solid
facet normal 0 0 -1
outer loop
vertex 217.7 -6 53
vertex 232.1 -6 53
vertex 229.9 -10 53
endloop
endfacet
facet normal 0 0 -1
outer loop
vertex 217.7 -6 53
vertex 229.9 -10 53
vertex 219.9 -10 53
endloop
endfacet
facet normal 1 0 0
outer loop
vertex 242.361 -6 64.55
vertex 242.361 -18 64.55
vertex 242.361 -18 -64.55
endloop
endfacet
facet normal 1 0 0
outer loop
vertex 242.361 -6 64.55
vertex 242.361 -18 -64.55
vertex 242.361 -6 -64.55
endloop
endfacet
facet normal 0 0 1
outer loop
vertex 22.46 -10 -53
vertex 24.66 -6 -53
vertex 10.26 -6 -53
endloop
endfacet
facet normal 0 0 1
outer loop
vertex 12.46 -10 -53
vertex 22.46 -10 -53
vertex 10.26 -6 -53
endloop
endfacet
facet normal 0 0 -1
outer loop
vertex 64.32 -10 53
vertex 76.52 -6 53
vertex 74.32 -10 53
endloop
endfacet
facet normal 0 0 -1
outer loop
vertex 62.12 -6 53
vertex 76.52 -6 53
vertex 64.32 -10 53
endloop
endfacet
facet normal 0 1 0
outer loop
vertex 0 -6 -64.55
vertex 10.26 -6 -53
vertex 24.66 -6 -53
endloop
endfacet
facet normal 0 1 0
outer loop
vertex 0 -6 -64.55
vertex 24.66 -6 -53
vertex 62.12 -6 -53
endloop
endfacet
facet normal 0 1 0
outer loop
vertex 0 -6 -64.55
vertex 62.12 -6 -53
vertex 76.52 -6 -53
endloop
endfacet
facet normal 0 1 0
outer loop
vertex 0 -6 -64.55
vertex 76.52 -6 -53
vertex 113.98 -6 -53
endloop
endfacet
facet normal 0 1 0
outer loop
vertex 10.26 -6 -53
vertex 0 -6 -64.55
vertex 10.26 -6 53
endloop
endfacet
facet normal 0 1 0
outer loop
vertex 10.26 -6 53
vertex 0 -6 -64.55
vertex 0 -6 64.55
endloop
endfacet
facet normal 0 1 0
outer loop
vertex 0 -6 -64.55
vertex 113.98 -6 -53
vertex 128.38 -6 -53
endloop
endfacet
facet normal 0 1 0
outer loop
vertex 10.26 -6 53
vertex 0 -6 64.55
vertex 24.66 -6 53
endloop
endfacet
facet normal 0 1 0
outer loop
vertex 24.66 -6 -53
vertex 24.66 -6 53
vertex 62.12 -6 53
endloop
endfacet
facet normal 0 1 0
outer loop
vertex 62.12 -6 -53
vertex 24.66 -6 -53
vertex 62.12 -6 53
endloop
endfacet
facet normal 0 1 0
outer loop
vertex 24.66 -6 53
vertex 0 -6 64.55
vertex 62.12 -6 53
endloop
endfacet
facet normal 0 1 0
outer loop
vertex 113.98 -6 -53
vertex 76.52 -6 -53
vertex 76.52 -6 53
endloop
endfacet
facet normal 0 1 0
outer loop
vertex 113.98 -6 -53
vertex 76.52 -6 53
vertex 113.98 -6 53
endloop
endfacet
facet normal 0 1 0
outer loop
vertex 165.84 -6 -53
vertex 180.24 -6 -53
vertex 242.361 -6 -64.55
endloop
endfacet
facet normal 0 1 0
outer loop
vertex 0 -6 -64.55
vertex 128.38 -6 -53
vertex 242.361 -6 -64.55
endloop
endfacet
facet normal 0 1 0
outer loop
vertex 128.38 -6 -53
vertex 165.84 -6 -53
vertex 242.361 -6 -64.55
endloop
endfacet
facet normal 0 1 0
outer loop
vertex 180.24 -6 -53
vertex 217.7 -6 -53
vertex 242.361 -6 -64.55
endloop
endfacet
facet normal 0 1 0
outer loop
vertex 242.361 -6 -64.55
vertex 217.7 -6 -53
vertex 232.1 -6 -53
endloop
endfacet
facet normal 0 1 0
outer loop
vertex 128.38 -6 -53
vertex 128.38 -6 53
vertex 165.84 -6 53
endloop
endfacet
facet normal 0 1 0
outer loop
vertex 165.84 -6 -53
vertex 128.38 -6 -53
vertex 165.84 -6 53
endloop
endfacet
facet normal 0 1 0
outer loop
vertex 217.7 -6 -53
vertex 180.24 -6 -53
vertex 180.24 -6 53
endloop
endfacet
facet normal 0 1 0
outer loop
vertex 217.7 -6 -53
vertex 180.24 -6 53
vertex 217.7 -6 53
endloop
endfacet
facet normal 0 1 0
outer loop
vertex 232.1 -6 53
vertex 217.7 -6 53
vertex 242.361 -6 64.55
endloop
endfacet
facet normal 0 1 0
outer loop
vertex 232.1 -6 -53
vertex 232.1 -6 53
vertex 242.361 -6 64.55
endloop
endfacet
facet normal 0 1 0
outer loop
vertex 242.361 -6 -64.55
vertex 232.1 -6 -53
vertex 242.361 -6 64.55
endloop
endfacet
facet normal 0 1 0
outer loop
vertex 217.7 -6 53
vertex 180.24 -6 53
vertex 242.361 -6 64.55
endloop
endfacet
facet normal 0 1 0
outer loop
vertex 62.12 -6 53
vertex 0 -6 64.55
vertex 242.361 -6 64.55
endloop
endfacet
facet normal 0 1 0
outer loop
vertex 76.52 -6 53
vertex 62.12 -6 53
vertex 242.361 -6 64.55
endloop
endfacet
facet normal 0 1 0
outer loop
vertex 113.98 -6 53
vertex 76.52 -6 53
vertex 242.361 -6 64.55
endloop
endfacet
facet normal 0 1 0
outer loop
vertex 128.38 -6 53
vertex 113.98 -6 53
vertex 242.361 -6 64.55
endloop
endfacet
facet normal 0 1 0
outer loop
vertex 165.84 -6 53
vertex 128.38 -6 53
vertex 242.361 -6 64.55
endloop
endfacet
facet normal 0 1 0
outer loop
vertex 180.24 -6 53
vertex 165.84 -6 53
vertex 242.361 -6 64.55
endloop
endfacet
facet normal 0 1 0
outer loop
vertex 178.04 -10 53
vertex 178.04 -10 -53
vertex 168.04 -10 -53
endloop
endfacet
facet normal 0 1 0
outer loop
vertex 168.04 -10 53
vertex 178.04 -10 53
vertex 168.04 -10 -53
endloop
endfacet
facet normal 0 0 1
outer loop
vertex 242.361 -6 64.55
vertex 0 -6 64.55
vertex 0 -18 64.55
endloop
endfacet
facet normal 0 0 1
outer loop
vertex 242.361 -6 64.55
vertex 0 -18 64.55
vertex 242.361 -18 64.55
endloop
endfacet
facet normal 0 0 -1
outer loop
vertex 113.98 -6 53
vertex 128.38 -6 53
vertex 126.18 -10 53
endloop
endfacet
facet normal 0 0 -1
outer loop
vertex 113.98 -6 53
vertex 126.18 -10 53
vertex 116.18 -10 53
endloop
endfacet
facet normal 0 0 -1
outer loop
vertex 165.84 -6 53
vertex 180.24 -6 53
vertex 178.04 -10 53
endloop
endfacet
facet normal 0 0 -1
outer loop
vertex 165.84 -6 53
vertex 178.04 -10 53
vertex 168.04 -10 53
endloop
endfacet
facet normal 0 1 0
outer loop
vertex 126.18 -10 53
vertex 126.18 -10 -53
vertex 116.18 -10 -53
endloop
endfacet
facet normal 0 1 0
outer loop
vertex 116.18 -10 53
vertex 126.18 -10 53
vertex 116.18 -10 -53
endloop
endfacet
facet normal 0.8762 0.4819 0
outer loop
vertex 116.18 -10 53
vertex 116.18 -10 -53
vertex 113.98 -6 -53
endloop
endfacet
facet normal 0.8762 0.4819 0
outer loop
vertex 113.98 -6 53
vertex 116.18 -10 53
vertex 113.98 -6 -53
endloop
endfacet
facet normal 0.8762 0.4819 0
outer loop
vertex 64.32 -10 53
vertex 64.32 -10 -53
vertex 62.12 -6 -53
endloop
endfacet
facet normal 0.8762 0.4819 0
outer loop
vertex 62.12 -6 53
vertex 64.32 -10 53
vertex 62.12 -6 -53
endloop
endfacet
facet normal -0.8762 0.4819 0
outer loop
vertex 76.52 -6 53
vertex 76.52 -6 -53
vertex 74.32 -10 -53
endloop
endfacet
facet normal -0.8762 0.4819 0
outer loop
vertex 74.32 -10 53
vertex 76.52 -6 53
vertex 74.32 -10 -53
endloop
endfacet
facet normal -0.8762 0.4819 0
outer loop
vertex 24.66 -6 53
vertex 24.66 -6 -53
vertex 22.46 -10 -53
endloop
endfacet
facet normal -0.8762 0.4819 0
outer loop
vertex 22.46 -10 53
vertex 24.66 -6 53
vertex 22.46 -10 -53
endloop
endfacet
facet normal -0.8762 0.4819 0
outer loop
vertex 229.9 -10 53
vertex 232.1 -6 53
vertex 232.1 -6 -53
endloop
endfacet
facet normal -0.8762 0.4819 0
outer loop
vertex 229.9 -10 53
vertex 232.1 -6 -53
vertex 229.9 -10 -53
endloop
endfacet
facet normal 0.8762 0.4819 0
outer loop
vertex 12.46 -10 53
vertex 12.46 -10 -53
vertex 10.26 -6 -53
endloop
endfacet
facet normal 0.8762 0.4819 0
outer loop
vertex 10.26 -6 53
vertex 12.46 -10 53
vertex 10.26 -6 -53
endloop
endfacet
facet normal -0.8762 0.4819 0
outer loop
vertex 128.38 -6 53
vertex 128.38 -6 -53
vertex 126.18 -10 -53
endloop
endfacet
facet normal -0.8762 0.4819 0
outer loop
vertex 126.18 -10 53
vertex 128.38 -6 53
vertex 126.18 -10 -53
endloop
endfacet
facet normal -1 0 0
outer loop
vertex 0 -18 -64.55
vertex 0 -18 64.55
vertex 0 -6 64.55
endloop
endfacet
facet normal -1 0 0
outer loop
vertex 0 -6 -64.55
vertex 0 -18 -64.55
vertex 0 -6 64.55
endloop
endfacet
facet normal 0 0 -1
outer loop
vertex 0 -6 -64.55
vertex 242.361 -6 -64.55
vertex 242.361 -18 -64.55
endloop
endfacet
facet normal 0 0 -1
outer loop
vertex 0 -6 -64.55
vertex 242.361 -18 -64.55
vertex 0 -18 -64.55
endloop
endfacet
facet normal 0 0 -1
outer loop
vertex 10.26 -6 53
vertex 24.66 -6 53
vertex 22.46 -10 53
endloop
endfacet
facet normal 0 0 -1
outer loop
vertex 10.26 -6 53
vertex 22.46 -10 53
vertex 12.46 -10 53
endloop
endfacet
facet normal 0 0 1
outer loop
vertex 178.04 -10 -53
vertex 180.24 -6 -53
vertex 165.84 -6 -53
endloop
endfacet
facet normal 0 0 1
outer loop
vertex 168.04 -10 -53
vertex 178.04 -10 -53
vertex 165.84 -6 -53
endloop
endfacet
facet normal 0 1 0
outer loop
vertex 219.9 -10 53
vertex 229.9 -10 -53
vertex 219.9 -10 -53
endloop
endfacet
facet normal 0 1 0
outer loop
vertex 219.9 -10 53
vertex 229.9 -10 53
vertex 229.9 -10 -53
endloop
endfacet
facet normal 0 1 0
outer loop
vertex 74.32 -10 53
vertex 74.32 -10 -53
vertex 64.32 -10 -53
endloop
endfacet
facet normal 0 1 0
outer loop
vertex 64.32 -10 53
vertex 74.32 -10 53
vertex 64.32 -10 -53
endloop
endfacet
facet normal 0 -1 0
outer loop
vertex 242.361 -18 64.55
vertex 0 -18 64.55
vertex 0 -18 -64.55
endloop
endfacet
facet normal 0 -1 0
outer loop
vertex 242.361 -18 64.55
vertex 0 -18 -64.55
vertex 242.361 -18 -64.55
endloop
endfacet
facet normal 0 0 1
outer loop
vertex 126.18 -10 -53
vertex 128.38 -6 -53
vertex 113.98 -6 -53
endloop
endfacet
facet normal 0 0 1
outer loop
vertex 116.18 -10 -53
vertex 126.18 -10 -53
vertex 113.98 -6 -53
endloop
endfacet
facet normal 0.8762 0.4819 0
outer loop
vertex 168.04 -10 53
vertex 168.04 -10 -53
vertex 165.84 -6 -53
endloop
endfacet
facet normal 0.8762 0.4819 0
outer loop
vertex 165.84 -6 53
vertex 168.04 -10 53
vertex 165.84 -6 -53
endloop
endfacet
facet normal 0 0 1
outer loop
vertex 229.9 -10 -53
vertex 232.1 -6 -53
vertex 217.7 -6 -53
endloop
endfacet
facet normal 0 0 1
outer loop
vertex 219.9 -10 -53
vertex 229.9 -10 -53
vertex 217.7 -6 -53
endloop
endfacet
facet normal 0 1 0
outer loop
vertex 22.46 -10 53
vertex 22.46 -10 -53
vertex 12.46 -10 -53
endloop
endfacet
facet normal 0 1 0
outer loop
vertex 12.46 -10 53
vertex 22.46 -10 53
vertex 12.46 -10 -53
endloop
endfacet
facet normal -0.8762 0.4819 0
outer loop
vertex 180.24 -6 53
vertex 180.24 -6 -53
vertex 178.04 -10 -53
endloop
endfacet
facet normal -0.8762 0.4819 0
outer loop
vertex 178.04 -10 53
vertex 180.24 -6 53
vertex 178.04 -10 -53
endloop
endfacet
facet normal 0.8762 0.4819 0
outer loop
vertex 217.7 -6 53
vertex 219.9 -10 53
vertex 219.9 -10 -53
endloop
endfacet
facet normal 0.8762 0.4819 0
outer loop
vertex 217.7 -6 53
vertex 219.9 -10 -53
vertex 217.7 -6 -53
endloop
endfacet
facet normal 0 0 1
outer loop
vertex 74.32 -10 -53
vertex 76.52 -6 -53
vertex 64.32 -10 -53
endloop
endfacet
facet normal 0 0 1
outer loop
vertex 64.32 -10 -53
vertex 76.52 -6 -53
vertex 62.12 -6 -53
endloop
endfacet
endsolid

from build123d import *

# Parameters (mm, degrees)
EXTRUDE_1_DEPTH     = 60
SKETCH_9_W          = 242.360715673
SKETCH_9_H          = 17.5
SKETCH_9_R          = 2.1
EXTRUDE_2_DEPTH     = 3
SKETCH_13_W         = 242.360715673
SKETCH_13_H         = 16
SKETCH_13_R         = 2.1
EXTRUDE_3_DEPTH     = 1.55
SKETCH_14_W         = 242.360715673
SKETCH_14_H         = 129.1
SKETCH_14_R         = 2.1
EXTRUDE_4_DEPTH     = 3
SKETCH_15_W         = 222.641049517
SKETCH_15_H         = 9.29970853
EXTRUDE_5_DEPTH     = 129.1
SKETCH_16_W         = 242.360715673
SKETCH_16_H         = 33.21324475
EXTRUDE_6_DEPTH     = 3
SKETCH_18_W         = 242.360715673
SKETCH_18_H         = 20.5
EXTRUDE_7_DEPTH     = 126.1
SKETCH_19_W         = 242.360715673
SKETCH_19_H         = 8.5
CUT_EXTRUDE_1_DEPTH = 276.18998256
CUT_EXTRUDE_2_DEPTH = 53


with BuildPart() as part:
    # ｽｹｯﾁ5 → ﾎﾞｽ - 押し出し1 (new body)
    with BuildSketch(Plane.XY.offset(-1.55)):
        with BuildLine():
            Line((242.360715673, -15), (242.360715673, -2.976))
            Line((242.360715673, -2.976), (240.239284327, -2.976))
            ThreePointArc((240.239284327, -2.976), (239.45348461, -2.728238301), (238.951905437, -2.074567596))
            Line((238.951905437, -2.074567596), (238.196824583, 0))
            Line((238.196824583, 0), (231.703175417, 0))
            Line((231.703175417, 0), (230.948094563, -2.074567596))
            ThreePointArc((230.948094563, -2.074567596), (230.44651539, -2.728238301), (229.660715673, -2.976))
            Line((229.660715673, -2.976), (227.539284327, -2.976))
            ThreePointArc((227.539284327, -2.976), (226.75348461, -2.728238301), (226.251905437, -2.074567596))
            Line((226.251905437, -2.074567596), (225.496824583, 0))
            Line((225.496824583, 0), (219.003175417, 0))
            Line((219.003175417, 0), (218.248094563, -2.074567596))
            ThreePointArc((218.248094563, -2.074567596), (217.74651539, -2.728238301), (216.960715673, -2.976))
            Line((216.960715673, -2.976), (214.839284327, -2.976))
            ThreePointArc((214.839284327, -2.976), (214.05348461, -2.728238301), (213.551905437, -2.074567596))
            Line((213.551905437, -2.074567596), (212.796824583, 0))
            Line((212.796824583, 0), (206.303175417, 0))
            Line((206.303175417, 0), (205.548094563, -2.074567596))
            ThreePointArc((205.548094563, -2.074567596), (205.04651539, -2.728238301), (204.260715673, -2.976))
            Line((204.260715673, -2.976), (202.139284327, -2.976))
            ThreePointArc((202.139284327, -2.976), (201.35348461, -2.728238301), (200.851905437, -2.074567596))
            Line((200.851905437, -2.074567596), (200.096824583, 0))
            Line((200.096824583, 0), (193.603175417, 0))
            Line((193.603175417, 0), (192.848094563, -2.074567596))
            ThreePointArc((192.848094563, -2.074567596), (192.34651539, -2.728238301), (191.560715673, -2.976))
            Line((191.560715673, -2.976), (189.439284327, -2.976))
            ThreePointArc((189.439284327, -2.976), (188.65348461, -2.728238301), (188.151905437, -2.074567596))
            Line((188.151905437, -2.074567596), (187.396824583, 0))
            Line((187.396824583, 0), (180.903175417, 0))
            Line((180.903175417, 0), (180.148094563, -2.074567596))
            ThreePointArc((180.148094563, -2.074567596), (179.64651539, -2.728238301), (178.860715673, -2.976))
            Line((178.860715673, -2.976), (176.739284327, -2.976))
            ThreePointArc((176.739284327, -2.976), (175.95348461, -2.728238301), (175.451905437, -2.074567596))
            Line((175.451905437, -2.074567596), (174.696824583, 0))
            Line((174.696824583, 0), (168.203175417, 0))
            Line((168.203175417, 0), (167.448094563, -2.074567596))
            ThreePointArc((167.448094563, -2.074567596), (166.94651539, -2.728238301), (166.160715673, -2.976))
            Line((166.160715673, -2.976), (164.039284327, -2.976))
            ThreePointArc((164.039284327, -2.976), (163.25348461, -2.728238301), (162.751905437, -2.074567596))
            Line((162.751905437, -2.074567596), (161.996824583, 0))
            Line((161.996824583, 0), (155.503175417, 0))
            Line((155.503175417, 0), (154.748094563, -2.074567596))
            ThreePointArc((154.748094563, -2.074567596), (154.24651539, -2.728238301), (153.460715673, -2.976))
            Line((153.460715673, -2.976), (151.339284327, -2.976))
            ThreePointArc((151.339284327, -2.976), (150.55348461, -2.728238301), (150.051905437, -2.074567596))
            Line((150.051905437, -2.074567596), (149.296824583, 0))
            Line((149.296824583, 0), (142.803175417, 0))
            Line((142.803175417, 0), (142.048094563, -2.074567596))
            ThreePointArc((142.048094563, -2.074567596), (141.54651539, -2.728238301), (140.760715673, -2.976))
            Line((140.760715673, -2.976), (138.639284327, -2.976))
            ThreePointArc((138.639284327, -2.976), (137.85348461, -2.728238301), (137.351905437, -2.074567596))
            Line((137.351905437, -2.074567596), (136.596824583, 0))
            Line((136.596824583, 0), (130.103175417, 0))
            Line((130.103175417, 0), (129.348094563, -2.074567596))
            ThreePointArc((129.348094563, -2.074567596), (128.84651539, -2.728238301), (128.060715673, -2.976))
            Line((128.060715673, -2.976), (125.939284327, -2.976))
            ThreePointArc((125.939284327, -2.976), (125.15348461, -2.728238301), (124.651905437, -2.074567596))
            Line((124.651905437, -2.074567596), (123.896824583, 0))
            Line((123.896824583, 0), (117.403175417, 0))
            Line((117.403175417, 0), (116.648094563, -2.074567596))
            ThreePointArc((116.648094563, -2.074567596), (116.14651539, -2.728238301), (115.360715673, -2.976))
            Line((115.360715673, -2.976), (113.239284327, -2.976))
            ThreePointArc((113.239284327, -2.976), (112.45348461, -2.728238301), (111.951905437, -2.074567596))
            Line((111.951905437, -2.074567596), (111.196824583, 0))
            Line((111.196824583, 0), (104.703175417, 0))
            Line((104.703175417, 0), (103.948094563, -2.074567596))
            ThreePointArc((103.948094563, -2.074567596), (103.44651539, -2.728238301), (102.660715673, -2.976))
            Line((102.660715673, -2.976), (100.539284327, -2.976))
            ThreePointArc((100.539284327, -2.976), (99.75348461, -2.728238301), (99.251905437, -2.074567596))
            Line((99.251905437, -2.074567596), (98.496824583, 0))
            Line((98.496824583, 0), (92.003175417, 0))
            Line((92.003175417, 0), (91.248094563, -2.074567596))
            ThreePointArc((91.248094563, -2.074567596), (90.74651539, -2.728238301), (89.960715673, -2.976))
            Line((89.960715673, -2.976), (87.839284327, -2.976))
            ThreePointArc((87.839284327, -2.976), (87.05348461, -2.728238301), (86.551905437, -2.074567596))
            Line((86.551905437, -2.074567596), (85.796824583, 0))
            Line((85.796824583, 0), (79.303175417, 0))
            Line((79.303175417, 0), (78.548094563, -2.074567596))
            ThreePointArc((78.548094563, -2.074567596), (78.04651539, -2.728238301), (77.260715673, -2.976))
            Line((77.260715673, -2.976), (75.139284327, -2.976))
            ThreePointArc((75.139284327, -2.976), (74.35348461, -2.728238301), (73.851905437, -2.074567596))
            Line((73.851905437, -2.074567596), (73.096824583, 0))
            Line((73.096824583, 0), (66.603175417, 0))
            Line((66.603175417, 0), (65.848094563, -2.074567596))
            ThreePointArc((65.848094563, -2.074567596), (65.34651539, -2.728238301), (64.560715673, -2.976))
            Line((64.560715673, -2.976), (62.439284327, -2.976))
            ThreePointArc((62.439284327, -2.976), (61.65348461, -2.728238301), (61.151905437, -2.074567596))
            Line((61.151905437, -2.074567596), (60.396824583, 0))
            Line((60.396824583, 0), (53.903175417, 0))
            Line((53.903175417, 0), (53.148094563, -2.074567596))
            ThreePointArc((53.148094563, -2.074567596), (52.64651539, -2.728238301), (51.860715673, -2.976))
            Line((51.860715673, -2.976), (49.739284327, -2.976))
            ThreePointArc((49.739284327, -2.976), (48.95348461, -2.728238301), (48.451905437, -2.074567596))
            Line((48.451905437, -2.074567596), (47.696824583, 0))
            Line((47.696824583, 0), (41.203175417, 0))
            Line((41.203175417, 0), (40.448094563, -2.074567596))
            ThreePointArc((40.448094563, -2.074567596), (39.94651539, -2.728238301), (39.160715673, -2.976))
            Line((39.160715673, -2.976), (37.039284327, -2.976))
            ThreePointArc((37.039284327, -2.976), (36.25348461, -2.728238301), (35.751905437, -2.074567596))
            Line((35.751905437, -2.074567596), (34.996824583, 0))
            Line((34.996824583, 0), (28.503175417, 0))
            Line((28.503175417, 0), (27.748094563, -2.074567596))
            ThreePointArc((27.748094563, -2.074567596), (27.24651539, -2.728238301), (26.460715673, -2.976))
            Line((26.460715673, -2.976), (24.339284327, -2.976))
            ThreePointArc((24.339284327, -2.976), (23.55348461, -2.728238301), (23.051905437, -2.074567596))
            Line((23.051905437, -2.074567596), (22.296824583, 0))
            Line((22.296824583, 0), (15.803175417, 0))
            Line((15.803175417, 0), (15.048094563, -2.074567596))
            ThreePointArc((15.048094563, -2.074567596), (14.54651539, -2.728238301), (13.760715673, -2.976))
            Line((13.760715673, -2.976), (11.639284327, -2.976))
            ThreePointArc((11.639284327, -2.976), (10.85348461, -2.728238301), (10.351905437, -2.074567596))
            Line((10.351905437, -2.074567596), (9.596824583, 0))
            Line((9.596824583, 0), (3.103175417, 0))
            Line((3.103175417, 0), (2.348094563, -2.074567596))
            ThreePointArc((2.348094563, -2.074567596), (1.84651539, -2.728238301), (1.060715673, -2.976))
            Line((1.060715673, -2.976), (0, -2.976))
            Line((0, -2.976), (0, -15))
            Line((0, -15), (242.360715673, -15))
        make_face()
    extrude(amount=-EXTRUDE_1_DEPTH)


with BuildPart() as body_2:
    # ｽｹｯﾁ9 → ﾎﾞｽ - 押し出し2 (new body)
    with BuildSketch(Plane(origin=(0, 0, -61.55), x_dir=(-1, 0, 0), z_dir=(0, 0, -1))):
        with Locations((-121.180357837, -6.25)):
            Rectangle(SKETCH_9_W, SKETCH_9_H)
        with Locations((-25, -7)):
            Circle(SKETCH_9_R, mode=Mode.SUBTRACT)
        with Locations((-85, -7)):
            Circle(SKETCH_9_R, mode=Mode.SUBTRACT)
        with Locations(Location((-157.360715673, -7, 0), (0, 0, 180))):
            Circle(SKETCH_9_R, mode=Mode.SUBTRACT)
        with Locations(Location((-217.360715673, -7, 0), (0, 0, 180))):
            Circle(SKETCH_9_R, mode=Mode.SUBTRACT)
    extrude(amount=EXTRUDE_2_DEPTH)


with BuildPart() as body_3:
    # ｽｹｯﾁ13 → ﾎﾞｽ - 押し出し3 (new, symmetric)
    with BuildSketch(Plane.XY):
        with Locations((121.180357837, -7)):
            Rectangle(SKETCH_13_W, SKETCH_13_H)
        with Locations(Location((85, -7, 0), (0, 0, 180))):
            Circle(SKETCH_13_R, mode=Mode.SUBTRACT)
        with Locations(Location((25, -7, 0), (0, 0, 180))):
            Circle(SKETCH_13_R, mode=Mode.SUBTRACT)
        with Locations((217.360715673, -7)):
            Circle(SKETCH_13_R, mode=Mode.SUBTRACT)
        with Locations((157.360715673, -7)):
            Circle(SKETCH_13_R, mode=Mode.SUBTRACT)
    extrude(amount=EXTRUDE_3_DEPTH, both=True)


with BuildPart() as body_4:
    # ﾐﾗｰ1: mirrored copy
    add(part.part.mirror(Plane.XY))


with BuildPart() as body_5:
    # Mirror 1 2: mirrored copy
    add(body_2.part.mirror(Plane.XY))


with BuildPart() as body_6:
    # ｽｹｯﾁ14 → ﾎﾞｽ - 押し出し4 (new body)
    with BuildSketch(Plane.XZ.offset(15)):
        with Locations((121.180357837, 0)):
            Rectangle(SKETCH_14_W, SKETCH_14_H)
        with Locations(Location((7, 31.55, 0), (0, 0, 180))):
            Circle(SKETCH_14_R, mode=Mode.SUBTRACT)
        with Locations((121.5, -31.55)):
            Circle(SKETCH_14_R, mode=Mode.SUBTRACT)
        with Locations((235.360715673, -31.55)):
            Circle(SKETCH_14_R, mode=Mode.SUBTRACT)
        with Locations((7, -31.55)):
            Circle(SKETCH_14_R, mode=Mode.SUBTRACT)
        with Locations(Location((235.360715673, 31.55, 0), (0, 0, 180))):
            Circle(SKETCH_14_R, mode=Mode.SUBTRACT)
        with Locations(Location((121.5, 31.55, 0), (0, 0, 180))):
            Circle(SKETCH_14_R, mode=Mode.SUBTRACT)
    extrude(amount=EXTRUDE_4_DEPTH)


with BuildPart() as body_4_1:
    add(body_4.part)

    # Combine 2: union part, body 5, body 6, body 3, body 2
    add(part.part)
    add(body_5.part)
    add(body_6.part)
    add(body_3.part)
    add(body_2.part)

    # ｽｹｯﾁ15 → ﾎﾞｽ - 押し出し5 (add)
    with BuildSketch(Plane(origin=(0, 0, -64.55), x_dir=(-1, 0, 0), z_dir=(0, 0, -1))):
        with Locations((-117.248229002, -7.625854265)):
            Rectangle(SKETCH_15_W, SKETCH_15_H)
    extrude(amount=-EXTRUDE_5_DEPTH)

    # ｽｹｯﾁ16 → ﾎﾞｽ - 押し出し6 (add)
    with BuildSketch(Plane.XZ.offset(18)):
        with Locations((121.180357837, 1.195676811)):
            Rectangle(SKETCH_16_W, SKETCH_16_H)
    extrude(amount=-EXTRUDE_6_DEPTH)

    # ｽｹｯﾁ18 → ﾎﾞｽ - 押し出し7 (add)
    with BuildSketch(Plane.XY.offset(64.55)):
        with Locations((121.180357837, -7.75)):
            Rectangle(SKETCH_18_W, SKETCH_18_H)
    extrude(amount=-EXTRUDE_7_DEPTH)

    # ｽｹｯﾁ19 → ｶｯﾄ - 押し出し1 (cut, through all)
    with BuildSketch(Plane.XY.offset(64.55)):
        with Locations((121.180357837, -1.75)):
            Rectangle(SKETCH_19_W, SKETCH_19_H)
    extrude(amount=-CUT_EXTRUDE_1_DEPTH, mode=Mode.SUBTRACT)

    # ｽｹｯﾁ17 → ｶｯﾄ - 押し出し2 (cut, symmetric)
    with BuildSketch(Plane.XY):
        Polygon((6.960357836, 0), (27.960357836, 0), (22.460357836, -10), (12.460357836, -10), align=None)
        Polygon((58.820357836, 0), (79.820357836, 0), (74.320357836, -10), (64.320357836, -10), align=None)
        Polygon((110.680357836, 0), (131.680357836, 0), (126.180357836, -10), (116.180357836, -10), align=None)
        Polygon((162.540357836, 0), (183.540357836, 0), (178.040357836, -10), (168.040357836, -10), align=None)
        Polygon((214.400357836, 0), (235.400357836, 0), (229.900357836, -10), (219.900357836, -10), align=None)
    extrude(amount=CUT_EXTRUDE_2_DEPTH, both=True, mode=Mode.SUBTRACT)


solid = body_4_1.part
